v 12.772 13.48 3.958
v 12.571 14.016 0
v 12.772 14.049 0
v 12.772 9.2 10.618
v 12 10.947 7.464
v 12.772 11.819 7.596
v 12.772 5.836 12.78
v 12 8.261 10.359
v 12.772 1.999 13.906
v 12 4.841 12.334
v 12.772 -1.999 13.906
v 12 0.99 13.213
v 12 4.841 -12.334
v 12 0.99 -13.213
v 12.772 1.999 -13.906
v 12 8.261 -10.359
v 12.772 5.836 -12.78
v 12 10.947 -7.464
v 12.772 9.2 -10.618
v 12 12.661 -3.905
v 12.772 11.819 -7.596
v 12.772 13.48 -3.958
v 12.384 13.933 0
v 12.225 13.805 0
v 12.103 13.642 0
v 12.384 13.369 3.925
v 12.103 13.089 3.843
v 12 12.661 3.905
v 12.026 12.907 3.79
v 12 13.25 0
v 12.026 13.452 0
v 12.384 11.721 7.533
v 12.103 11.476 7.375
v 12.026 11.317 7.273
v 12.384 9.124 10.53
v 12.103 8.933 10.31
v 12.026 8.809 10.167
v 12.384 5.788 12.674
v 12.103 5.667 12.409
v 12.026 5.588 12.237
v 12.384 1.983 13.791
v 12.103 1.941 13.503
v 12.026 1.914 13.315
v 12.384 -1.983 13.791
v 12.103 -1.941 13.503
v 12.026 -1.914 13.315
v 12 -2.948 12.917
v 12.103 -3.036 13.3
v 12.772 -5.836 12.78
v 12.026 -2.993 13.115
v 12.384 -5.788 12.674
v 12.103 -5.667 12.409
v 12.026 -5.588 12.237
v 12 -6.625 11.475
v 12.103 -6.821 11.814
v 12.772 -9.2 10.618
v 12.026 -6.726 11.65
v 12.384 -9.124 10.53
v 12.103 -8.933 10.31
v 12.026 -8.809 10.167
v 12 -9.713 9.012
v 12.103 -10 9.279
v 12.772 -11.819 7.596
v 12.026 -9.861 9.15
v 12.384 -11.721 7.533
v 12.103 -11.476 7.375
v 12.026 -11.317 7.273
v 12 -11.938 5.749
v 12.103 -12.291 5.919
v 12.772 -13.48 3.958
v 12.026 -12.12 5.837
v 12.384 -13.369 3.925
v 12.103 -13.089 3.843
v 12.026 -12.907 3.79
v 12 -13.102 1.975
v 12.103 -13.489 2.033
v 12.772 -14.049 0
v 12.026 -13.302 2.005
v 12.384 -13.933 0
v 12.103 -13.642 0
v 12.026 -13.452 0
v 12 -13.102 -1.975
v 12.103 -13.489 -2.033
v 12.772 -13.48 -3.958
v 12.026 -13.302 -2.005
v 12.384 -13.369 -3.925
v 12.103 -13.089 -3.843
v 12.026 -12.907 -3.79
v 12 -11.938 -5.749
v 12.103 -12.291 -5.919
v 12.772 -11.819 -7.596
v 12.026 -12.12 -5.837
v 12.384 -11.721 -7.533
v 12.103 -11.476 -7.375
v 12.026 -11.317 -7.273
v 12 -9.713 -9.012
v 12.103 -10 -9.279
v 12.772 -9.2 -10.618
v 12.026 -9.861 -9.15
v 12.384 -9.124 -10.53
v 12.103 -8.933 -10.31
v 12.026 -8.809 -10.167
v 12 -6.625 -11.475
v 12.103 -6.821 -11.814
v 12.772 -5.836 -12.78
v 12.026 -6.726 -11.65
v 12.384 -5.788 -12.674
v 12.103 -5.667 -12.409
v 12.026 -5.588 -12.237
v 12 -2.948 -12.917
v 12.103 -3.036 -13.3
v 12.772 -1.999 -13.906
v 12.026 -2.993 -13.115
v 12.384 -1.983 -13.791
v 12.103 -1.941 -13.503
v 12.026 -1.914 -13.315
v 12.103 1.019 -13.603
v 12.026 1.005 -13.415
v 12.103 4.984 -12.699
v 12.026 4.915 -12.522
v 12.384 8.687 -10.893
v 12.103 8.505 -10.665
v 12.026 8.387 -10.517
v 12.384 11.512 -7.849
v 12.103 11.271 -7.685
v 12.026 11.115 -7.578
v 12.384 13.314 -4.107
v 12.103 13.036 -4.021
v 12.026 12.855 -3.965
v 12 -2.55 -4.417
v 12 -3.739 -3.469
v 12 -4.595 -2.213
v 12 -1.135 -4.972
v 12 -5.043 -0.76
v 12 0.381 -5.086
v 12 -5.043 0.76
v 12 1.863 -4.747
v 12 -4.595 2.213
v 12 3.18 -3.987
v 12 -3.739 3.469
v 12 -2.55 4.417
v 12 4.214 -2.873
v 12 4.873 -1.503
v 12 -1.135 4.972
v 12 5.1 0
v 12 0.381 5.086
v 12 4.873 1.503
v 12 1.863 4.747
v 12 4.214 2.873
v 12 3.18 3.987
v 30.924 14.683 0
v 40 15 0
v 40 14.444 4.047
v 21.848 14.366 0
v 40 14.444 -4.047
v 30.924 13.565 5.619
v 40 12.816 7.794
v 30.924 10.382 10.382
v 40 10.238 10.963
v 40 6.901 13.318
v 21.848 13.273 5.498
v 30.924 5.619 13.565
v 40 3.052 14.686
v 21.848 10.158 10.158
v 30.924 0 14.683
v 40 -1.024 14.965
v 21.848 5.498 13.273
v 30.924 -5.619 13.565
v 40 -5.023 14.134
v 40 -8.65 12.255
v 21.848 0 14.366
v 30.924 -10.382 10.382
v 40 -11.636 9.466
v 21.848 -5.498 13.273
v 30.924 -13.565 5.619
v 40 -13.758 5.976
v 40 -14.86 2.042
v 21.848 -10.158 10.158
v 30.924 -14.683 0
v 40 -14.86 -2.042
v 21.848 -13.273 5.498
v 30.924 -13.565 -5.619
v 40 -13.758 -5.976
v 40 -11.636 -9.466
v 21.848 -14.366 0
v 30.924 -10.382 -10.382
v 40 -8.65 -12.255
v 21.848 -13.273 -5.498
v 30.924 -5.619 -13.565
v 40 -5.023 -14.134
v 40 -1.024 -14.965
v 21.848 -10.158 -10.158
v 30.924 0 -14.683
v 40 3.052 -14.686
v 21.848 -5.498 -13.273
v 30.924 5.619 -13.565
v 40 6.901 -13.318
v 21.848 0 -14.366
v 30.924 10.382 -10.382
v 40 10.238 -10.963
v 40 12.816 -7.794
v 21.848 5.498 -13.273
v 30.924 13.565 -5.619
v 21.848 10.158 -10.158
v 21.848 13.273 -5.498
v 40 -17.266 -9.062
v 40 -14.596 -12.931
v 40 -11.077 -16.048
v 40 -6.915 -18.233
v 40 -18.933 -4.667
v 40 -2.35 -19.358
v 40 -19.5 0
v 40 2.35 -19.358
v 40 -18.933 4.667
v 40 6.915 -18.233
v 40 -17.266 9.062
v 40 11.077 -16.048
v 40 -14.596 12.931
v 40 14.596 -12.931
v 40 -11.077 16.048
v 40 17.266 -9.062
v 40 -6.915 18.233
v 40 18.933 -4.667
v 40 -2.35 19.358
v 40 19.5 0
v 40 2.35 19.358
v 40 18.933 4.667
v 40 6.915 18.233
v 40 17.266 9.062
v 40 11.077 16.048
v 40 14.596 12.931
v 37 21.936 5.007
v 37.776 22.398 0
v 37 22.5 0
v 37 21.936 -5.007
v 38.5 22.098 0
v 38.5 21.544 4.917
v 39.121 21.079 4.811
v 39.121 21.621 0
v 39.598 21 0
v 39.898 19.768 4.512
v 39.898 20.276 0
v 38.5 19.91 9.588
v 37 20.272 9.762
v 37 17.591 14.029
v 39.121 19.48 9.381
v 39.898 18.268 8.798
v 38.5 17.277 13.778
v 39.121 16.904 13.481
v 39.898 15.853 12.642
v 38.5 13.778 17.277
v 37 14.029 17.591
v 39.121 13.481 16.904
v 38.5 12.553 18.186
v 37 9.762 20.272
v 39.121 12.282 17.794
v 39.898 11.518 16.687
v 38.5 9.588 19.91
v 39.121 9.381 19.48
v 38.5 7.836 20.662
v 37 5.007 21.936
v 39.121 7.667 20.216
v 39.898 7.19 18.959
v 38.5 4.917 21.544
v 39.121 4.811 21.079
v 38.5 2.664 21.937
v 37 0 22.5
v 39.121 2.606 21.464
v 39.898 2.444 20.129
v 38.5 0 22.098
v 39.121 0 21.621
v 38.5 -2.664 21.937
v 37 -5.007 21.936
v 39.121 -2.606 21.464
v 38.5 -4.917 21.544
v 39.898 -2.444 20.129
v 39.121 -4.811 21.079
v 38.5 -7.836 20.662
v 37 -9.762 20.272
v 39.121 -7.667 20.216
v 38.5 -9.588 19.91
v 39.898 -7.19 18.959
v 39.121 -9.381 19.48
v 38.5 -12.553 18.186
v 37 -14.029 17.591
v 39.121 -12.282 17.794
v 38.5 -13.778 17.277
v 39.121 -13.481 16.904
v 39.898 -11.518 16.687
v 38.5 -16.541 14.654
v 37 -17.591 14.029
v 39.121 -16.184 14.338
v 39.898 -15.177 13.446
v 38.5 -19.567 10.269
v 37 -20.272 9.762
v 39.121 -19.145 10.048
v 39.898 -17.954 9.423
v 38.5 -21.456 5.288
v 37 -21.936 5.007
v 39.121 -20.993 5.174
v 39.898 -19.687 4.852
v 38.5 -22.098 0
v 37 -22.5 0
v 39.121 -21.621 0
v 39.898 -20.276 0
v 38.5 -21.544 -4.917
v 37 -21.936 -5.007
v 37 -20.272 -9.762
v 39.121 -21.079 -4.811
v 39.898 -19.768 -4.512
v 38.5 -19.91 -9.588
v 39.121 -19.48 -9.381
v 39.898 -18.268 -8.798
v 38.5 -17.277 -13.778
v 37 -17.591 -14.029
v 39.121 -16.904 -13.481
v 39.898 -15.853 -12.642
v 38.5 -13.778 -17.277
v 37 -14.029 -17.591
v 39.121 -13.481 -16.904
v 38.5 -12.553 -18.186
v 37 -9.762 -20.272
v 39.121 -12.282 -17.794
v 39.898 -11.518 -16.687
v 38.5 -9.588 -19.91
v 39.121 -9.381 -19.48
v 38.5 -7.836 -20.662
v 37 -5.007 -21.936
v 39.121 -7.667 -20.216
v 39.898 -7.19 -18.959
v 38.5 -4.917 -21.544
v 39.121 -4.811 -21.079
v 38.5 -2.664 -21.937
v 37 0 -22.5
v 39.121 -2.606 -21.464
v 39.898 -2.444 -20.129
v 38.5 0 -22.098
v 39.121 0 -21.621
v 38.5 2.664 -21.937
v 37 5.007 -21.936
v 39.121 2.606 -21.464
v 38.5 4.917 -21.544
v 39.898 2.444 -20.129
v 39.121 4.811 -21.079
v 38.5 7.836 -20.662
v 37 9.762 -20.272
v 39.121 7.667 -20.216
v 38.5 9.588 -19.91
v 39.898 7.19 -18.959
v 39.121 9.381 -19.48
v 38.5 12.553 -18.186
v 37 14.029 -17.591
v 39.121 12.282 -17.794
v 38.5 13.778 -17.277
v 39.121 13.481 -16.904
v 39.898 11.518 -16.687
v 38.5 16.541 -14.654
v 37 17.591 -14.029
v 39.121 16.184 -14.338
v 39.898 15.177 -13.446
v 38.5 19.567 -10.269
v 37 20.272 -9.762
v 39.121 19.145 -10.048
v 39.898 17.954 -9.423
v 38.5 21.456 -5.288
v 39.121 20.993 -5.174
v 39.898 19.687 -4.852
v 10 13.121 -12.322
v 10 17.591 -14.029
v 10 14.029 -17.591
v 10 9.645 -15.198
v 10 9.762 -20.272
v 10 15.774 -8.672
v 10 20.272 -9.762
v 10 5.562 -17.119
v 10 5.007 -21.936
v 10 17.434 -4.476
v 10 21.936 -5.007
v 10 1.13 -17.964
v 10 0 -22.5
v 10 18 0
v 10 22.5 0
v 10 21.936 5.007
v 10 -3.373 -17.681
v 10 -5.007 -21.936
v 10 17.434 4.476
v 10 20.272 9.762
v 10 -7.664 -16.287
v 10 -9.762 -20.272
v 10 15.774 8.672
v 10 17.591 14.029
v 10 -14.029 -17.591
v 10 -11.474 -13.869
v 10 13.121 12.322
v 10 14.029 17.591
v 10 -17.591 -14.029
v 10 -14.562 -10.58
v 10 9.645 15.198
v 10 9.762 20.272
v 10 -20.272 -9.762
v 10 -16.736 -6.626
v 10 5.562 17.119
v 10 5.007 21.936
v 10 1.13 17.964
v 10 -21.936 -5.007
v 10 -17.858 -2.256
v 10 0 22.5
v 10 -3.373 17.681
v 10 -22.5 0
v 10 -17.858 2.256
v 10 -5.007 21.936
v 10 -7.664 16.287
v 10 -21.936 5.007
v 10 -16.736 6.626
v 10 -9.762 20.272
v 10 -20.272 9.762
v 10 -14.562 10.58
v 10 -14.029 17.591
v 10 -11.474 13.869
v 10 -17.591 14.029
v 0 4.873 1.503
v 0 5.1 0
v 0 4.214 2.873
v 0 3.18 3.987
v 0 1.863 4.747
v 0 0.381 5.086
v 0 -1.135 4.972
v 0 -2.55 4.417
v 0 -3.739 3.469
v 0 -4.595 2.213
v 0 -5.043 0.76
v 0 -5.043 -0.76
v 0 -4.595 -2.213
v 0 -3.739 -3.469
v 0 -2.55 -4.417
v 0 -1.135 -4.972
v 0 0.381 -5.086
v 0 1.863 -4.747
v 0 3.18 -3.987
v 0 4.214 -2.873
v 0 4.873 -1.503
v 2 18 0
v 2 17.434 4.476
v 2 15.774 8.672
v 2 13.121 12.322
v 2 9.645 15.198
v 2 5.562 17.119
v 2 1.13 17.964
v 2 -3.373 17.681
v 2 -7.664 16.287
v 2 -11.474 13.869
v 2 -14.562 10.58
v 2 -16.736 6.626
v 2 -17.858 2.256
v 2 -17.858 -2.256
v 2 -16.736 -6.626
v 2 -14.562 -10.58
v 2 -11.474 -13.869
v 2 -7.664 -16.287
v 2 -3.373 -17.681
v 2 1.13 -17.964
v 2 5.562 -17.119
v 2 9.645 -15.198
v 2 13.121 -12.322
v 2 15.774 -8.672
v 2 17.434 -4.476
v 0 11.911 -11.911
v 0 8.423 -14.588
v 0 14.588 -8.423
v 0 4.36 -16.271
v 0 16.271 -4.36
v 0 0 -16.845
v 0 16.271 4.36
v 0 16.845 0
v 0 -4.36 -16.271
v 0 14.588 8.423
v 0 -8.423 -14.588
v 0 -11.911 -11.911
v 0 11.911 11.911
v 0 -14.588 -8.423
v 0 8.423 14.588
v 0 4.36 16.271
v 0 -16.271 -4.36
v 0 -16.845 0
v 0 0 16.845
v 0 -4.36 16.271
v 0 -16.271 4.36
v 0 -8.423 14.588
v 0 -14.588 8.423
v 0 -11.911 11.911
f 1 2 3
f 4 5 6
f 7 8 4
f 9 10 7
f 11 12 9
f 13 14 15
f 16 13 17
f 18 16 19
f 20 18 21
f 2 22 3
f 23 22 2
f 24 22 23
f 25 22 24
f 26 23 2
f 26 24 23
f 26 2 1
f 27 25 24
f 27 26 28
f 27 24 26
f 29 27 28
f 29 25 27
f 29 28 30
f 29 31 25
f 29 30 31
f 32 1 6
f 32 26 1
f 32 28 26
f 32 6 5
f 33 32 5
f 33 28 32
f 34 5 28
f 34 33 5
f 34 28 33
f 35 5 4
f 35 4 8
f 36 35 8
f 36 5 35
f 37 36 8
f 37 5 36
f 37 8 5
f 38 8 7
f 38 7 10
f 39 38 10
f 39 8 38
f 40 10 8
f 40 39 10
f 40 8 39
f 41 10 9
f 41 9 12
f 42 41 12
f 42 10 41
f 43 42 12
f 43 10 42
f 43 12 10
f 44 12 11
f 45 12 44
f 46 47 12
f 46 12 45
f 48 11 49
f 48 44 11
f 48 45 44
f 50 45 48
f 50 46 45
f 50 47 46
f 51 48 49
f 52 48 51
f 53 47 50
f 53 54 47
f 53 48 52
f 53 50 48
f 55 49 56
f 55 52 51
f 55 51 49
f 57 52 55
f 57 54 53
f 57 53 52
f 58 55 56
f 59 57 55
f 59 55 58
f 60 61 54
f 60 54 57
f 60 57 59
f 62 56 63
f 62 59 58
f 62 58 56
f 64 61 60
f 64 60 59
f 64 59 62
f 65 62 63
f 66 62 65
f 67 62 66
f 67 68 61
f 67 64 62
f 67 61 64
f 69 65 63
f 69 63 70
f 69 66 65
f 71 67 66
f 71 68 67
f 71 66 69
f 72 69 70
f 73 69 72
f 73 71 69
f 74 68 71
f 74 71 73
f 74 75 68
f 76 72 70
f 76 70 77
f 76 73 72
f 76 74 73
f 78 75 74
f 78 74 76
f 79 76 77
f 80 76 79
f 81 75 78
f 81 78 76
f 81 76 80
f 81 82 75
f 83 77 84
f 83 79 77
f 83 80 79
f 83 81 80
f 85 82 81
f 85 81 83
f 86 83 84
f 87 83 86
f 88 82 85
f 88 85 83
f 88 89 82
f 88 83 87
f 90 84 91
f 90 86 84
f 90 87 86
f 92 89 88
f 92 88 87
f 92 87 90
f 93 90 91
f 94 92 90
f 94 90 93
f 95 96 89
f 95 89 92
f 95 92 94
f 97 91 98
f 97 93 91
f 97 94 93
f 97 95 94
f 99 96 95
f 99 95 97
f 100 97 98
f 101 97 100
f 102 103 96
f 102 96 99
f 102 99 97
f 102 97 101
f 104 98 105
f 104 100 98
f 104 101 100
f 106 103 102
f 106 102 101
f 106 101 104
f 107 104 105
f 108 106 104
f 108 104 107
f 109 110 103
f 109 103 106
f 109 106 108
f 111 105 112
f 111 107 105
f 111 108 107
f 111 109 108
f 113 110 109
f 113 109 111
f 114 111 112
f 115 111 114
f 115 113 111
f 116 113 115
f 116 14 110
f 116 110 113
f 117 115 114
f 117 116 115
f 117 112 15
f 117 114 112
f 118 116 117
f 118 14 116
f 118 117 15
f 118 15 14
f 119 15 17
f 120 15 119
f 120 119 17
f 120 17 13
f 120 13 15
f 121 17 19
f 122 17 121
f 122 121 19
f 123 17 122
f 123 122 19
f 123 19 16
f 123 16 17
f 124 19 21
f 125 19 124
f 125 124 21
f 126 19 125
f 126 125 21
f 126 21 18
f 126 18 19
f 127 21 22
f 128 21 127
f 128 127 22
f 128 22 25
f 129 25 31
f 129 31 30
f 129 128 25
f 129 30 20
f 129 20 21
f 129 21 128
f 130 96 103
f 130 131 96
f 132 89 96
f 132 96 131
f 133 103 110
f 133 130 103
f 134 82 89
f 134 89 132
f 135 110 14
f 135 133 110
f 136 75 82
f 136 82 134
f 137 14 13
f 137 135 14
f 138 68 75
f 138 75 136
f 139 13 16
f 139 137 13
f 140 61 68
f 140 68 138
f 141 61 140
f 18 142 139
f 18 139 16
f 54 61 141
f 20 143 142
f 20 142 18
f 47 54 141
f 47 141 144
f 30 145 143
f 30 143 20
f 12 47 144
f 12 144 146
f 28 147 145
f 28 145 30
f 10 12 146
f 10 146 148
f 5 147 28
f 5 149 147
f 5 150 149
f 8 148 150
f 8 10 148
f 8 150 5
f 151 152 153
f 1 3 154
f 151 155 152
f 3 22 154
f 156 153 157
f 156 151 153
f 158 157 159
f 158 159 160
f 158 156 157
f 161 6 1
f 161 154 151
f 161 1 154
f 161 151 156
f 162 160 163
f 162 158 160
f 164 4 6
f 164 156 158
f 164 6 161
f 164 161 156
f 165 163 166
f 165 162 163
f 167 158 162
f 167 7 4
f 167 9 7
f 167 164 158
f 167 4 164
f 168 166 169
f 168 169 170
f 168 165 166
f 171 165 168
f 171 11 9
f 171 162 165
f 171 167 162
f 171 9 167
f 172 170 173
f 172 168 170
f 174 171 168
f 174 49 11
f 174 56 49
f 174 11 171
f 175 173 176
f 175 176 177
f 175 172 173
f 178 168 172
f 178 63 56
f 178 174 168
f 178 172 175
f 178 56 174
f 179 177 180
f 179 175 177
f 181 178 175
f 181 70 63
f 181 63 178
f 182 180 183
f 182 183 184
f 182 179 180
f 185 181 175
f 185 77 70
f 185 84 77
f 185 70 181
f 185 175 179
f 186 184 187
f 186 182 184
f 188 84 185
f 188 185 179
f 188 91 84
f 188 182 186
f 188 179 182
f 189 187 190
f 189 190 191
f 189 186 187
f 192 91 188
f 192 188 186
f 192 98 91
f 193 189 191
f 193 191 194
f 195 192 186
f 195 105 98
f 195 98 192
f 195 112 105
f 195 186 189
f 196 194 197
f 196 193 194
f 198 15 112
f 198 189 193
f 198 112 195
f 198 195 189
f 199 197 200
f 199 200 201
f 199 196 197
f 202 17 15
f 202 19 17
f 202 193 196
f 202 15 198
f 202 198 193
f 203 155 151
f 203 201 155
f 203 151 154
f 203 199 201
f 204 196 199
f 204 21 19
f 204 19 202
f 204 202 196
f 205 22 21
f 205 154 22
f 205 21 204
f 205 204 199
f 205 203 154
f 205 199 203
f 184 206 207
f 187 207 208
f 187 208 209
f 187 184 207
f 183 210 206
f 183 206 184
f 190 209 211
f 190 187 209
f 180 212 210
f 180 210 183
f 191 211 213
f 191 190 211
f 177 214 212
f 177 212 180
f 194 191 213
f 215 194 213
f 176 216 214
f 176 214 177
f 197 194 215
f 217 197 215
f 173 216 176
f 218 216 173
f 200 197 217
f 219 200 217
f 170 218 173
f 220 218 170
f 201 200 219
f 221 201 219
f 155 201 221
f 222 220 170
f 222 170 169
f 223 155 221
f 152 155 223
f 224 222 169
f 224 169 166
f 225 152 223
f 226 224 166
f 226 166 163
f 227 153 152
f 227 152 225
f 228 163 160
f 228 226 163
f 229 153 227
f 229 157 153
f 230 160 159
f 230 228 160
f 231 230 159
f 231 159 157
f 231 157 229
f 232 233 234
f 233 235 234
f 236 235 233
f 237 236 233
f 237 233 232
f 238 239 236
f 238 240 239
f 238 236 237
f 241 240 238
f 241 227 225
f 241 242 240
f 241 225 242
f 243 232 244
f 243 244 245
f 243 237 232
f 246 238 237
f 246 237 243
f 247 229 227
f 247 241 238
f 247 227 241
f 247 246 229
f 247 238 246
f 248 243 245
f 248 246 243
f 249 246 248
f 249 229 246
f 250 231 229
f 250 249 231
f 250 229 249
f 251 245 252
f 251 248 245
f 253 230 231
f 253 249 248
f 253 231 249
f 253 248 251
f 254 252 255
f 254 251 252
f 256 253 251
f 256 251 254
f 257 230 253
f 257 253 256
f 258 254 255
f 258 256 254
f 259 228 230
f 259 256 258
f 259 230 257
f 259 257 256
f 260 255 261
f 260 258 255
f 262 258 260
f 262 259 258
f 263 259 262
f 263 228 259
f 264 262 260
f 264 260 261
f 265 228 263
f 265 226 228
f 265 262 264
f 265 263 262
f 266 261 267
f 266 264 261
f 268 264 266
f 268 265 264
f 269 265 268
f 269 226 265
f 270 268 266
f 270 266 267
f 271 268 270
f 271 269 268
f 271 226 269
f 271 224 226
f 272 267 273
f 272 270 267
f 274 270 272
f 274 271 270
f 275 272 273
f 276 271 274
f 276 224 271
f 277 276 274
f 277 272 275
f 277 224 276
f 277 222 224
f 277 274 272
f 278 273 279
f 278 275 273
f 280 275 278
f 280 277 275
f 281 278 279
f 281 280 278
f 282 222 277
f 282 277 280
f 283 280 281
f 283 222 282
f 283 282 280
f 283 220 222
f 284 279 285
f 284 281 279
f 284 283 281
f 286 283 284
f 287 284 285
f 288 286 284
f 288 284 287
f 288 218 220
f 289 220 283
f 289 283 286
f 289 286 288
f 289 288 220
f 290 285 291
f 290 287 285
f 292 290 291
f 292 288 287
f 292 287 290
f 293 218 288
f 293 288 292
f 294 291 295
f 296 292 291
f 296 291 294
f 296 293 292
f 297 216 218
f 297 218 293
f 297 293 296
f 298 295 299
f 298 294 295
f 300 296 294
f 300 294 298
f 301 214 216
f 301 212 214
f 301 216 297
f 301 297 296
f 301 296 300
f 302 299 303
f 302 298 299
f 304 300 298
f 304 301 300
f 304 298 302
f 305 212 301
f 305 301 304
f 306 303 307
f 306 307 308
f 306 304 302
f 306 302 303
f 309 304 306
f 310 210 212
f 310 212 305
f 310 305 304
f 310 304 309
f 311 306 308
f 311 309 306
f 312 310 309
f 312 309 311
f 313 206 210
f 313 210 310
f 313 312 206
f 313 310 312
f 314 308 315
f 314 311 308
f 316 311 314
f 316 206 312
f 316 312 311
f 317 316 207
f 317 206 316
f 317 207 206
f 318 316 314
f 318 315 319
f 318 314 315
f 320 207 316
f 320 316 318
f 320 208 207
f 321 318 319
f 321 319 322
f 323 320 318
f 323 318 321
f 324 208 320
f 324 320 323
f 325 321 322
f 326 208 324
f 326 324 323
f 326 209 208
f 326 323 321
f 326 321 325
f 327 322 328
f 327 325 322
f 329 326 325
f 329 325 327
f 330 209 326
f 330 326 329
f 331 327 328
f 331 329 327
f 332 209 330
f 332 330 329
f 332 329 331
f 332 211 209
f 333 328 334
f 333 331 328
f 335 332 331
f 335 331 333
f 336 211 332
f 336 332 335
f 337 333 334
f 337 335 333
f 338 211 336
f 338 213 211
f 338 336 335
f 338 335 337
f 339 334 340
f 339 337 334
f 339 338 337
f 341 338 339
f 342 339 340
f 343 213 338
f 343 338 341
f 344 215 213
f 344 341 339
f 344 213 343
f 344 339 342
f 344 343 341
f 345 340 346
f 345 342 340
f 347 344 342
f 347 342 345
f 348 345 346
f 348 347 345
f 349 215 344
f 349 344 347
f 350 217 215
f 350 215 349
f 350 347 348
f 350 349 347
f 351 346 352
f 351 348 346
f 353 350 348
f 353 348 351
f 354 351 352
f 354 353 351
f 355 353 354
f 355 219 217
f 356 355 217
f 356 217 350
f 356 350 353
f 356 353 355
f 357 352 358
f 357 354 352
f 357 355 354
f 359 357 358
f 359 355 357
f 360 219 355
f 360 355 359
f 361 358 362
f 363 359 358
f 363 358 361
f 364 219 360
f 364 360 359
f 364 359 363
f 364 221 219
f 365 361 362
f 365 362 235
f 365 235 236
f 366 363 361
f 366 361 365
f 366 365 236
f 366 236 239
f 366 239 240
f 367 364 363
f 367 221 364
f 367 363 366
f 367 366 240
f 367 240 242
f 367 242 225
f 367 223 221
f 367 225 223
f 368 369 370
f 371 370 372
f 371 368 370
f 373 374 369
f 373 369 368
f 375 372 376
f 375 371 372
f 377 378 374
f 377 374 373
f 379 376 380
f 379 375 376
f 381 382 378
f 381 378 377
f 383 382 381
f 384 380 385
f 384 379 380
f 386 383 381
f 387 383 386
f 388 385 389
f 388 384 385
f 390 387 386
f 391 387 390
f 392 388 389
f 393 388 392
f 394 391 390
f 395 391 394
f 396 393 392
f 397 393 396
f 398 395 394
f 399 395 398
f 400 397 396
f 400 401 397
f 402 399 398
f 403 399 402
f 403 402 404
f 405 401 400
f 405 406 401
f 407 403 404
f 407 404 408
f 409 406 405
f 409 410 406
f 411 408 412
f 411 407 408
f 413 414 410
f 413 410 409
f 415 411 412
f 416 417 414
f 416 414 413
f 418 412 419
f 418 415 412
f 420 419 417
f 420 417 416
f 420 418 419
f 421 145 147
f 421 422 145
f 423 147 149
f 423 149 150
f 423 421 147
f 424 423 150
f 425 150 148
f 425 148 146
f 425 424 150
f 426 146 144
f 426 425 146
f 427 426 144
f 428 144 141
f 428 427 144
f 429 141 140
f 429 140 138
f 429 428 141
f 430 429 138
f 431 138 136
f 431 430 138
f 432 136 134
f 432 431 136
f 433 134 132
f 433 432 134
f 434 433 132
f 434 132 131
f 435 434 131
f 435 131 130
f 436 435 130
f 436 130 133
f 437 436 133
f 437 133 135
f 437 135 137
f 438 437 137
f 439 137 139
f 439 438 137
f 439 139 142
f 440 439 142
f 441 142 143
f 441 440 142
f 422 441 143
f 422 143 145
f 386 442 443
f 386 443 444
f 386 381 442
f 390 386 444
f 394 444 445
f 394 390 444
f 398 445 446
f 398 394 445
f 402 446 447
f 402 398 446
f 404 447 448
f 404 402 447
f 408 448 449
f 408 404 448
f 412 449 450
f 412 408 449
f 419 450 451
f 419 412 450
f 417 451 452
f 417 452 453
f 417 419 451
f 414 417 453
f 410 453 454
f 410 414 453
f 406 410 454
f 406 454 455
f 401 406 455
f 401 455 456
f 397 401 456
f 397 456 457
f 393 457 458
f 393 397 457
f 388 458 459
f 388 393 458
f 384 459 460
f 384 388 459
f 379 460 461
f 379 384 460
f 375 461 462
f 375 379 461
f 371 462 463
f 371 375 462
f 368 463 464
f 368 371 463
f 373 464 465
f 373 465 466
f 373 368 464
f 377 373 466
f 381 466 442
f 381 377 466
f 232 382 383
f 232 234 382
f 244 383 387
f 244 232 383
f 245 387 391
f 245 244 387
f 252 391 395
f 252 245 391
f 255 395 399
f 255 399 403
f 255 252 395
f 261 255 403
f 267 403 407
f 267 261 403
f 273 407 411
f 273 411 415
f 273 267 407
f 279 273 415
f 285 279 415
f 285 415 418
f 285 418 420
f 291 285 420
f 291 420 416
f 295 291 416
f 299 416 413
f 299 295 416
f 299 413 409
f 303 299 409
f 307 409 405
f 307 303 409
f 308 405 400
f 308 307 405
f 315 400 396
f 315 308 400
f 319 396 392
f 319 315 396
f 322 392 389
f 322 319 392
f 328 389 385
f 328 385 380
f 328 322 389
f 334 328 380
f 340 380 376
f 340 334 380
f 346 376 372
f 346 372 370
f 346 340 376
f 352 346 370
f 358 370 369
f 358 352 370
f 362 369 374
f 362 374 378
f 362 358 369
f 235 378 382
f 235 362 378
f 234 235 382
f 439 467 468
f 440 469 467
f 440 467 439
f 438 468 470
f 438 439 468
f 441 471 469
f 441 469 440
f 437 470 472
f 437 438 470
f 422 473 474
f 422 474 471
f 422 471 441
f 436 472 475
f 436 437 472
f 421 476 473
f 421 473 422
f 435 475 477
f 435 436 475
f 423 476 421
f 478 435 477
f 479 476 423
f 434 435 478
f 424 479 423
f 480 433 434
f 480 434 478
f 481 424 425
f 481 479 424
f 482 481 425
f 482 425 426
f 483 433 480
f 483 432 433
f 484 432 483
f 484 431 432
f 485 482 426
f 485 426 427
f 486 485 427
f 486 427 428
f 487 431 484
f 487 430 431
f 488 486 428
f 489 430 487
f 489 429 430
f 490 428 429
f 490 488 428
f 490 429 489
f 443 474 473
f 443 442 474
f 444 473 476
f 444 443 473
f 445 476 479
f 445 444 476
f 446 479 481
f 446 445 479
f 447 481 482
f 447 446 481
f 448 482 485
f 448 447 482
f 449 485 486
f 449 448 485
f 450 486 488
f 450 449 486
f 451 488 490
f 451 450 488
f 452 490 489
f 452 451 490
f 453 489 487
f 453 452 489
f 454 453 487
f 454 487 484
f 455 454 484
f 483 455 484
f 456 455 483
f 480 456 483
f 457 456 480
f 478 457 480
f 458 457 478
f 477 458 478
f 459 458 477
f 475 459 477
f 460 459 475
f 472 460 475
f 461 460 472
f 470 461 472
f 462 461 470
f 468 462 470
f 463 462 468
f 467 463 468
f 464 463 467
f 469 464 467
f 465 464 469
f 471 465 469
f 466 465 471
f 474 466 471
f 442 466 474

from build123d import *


with BuildPart() as part:
    # Sketch1 → Revolve1 (revolve)
    with BuildSketch(Plane.XY):
        with BuildLine():
            Line((0, 16.845299462), (2, 18))
            Line((2, 18), (10, 18))
            Line((10, 18), (10, 22.5))
            Line((10, 22.5), (37, 22.5))
            ThreePointArc((37, 22.5), (39.121320344, 21.621320344), (40, 19.5))
            Line((40, 19.5), (40, 15))
            Line((40, 15), (12.772080403, 14.049180096))
            ThreePointArc((12.772080403, 14.049180096), (12.22452816, 13.805394131), (12, 13.249667434))
            Line((12, 13.249667434), (12, 5.1))
            Line((12, 5.1), (0, 5.1))
            Line((0, 5.1), (0, 16.845299462))
        make_face()
    revolve(axis=Axis((0, 0, 0), (1, 0, 0)))


solid = part.part
